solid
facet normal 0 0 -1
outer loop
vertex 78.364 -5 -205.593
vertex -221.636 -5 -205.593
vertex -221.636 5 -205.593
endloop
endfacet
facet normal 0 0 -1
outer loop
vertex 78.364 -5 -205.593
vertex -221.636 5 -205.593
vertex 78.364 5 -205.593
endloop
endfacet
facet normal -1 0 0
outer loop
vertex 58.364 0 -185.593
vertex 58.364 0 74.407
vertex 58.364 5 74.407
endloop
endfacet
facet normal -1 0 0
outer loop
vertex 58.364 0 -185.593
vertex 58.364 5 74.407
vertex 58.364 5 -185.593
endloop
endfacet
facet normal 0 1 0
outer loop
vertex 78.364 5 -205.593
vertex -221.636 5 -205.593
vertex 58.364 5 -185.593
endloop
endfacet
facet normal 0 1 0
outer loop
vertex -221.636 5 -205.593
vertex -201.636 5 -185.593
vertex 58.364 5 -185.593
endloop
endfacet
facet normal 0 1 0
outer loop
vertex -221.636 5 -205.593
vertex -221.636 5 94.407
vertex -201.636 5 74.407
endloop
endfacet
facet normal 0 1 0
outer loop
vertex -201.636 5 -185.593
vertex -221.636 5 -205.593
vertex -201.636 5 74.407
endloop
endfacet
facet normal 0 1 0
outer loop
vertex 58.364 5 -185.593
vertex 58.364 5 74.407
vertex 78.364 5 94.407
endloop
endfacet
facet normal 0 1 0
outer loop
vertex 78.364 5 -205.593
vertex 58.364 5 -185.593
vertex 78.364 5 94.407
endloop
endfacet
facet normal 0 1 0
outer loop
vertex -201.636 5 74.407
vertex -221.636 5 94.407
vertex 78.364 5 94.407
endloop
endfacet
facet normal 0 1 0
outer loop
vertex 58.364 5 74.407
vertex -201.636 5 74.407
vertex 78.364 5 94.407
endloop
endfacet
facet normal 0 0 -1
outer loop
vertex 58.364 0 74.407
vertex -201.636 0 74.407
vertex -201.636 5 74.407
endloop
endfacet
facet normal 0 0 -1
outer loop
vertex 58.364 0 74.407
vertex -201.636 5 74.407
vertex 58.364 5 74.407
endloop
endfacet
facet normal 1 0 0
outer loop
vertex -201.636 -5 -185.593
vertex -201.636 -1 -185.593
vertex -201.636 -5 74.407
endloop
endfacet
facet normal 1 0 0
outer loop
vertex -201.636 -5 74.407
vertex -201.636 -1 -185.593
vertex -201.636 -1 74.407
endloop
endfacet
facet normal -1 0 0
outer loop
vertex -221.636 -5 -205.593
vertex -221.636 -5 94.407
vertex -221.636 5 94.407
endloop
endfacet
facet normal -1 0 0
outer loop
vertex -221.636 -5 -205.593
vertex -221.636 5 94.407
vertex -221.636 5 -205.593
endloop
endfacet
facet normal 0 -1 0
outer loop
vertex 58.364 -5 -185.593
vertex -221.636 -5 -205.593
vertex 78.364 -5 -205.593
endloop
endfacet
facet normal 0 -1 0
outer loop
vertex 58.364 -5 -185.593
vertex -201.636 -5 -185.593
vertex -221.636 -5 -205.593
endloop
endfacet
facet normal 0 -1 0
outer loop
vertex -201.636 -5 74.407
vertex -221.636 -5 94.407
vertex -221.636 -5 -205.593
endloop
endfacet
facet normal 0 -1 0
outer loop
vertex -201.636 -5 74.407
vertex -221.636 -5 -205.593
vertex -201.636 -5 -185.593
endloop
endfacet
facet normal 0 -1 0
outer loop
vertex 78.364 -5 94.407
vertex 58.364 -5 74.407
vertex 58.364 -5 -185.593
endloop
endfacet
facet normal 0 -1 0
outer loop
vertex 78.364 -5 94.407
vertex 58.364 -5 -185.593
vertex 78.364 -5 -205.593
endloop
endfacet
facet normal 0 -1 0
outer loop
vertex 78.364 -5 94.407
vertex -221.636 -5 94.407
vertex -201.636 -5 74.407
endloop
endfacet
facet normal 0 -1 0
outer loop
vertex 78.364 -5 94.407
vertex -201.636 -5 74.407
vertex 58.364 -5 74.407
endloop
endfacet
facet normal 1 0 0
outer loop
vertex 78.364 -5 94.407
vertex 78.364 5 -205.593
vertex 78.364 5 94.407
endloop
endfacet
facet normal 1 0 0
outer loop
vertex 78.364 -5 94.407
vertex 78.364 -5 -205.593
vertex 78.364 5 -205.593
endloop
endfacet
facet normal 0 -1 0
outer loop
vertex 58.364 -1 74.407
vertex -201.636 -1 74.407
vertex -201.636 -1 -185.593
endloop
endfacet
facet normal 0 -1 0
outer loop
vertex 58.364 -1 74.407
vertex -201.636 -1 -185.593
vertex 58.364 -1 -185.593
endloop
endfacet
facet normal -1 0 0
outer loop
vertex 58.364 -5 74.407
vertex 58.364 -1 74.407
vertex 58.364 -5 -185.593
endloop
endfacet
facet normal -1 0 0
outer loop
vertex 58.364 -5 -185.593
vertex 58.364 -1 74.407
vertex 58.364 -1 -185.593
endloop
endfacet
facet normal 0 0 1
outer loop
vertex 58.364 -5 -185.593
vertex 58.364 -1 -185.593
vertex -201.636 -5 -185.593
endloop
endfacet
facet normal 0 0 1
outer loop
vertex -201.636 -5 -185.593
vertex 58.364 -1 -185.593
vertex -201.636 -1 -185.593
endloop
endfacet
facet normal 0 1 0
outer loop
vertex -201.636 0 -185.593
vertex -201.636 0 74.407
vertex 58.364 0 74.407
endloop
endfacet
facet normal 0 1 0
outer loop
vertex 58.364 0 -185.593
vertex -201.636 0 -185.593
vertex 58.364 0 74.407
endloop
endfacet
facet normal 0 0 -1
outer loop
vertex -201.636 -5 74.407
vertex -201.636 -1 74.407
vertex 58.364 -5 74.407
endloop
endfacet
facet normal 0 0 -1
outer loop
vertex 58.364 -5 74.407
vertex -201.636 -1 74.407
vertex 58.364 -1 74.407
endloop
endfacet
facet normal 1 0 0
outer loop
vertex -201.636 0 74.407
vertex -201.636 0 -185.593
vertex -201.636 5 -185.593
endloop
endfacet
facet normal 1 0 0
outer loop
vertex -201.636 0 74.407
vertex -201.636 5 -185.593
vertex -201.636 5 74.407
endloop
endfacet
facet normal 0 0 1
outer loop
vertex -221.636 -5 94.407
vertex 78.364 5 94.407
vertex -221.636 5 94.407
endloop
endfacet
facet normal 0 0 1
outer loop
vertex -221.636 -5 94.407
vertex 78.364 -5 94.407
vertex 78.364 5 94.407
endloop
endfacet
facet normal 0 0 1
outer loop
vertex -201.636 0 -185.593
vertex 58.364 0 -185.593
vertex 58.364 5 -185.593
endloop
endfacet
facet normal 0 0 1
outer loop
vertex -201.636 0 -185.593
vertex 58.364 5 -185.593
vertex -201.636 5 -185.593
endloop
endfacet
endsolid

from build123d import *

# Parameters (mm, degrees)
F0_W     = 260
F0_H     = 260
F1_DEPTH = 1
F0_H_2   = 20
F0_W_2   = 20
F2_DEPTH = 5
F3_DEPTH = 5


with BuildPart() as f1:
    # F0 (on Front) → F1 (new body)
    with BuildSketch(Plane.XZ):
        with Locations((-71.63621746, -55.5927120769)):
            Rectangle(F0_W, F0_H)
    extrude(amount=F1_DEPTH)

    # F0 (on Front) → F2 (join)
    with BuildSketch(Plane.XZ):
        with Locations((-71.63621746, 84.4072879231)):
            Rectangle(F0_W, F0_H_2)
        with Locations((68.36378254, 84.4072879231)):
            Rectangle(F0_W_2, F0_H_2)
        with Locations((68.36378254, -55.5927120769)):
            Rectangle(F0_W_2, F0_H)
        with Locations((68.36378254, -195.5927120769)):
            Rectangle(F0_W_2, F0_H_2)
        with Locations((-71.63621746, -195.5927120769)):
            Rectangle(F0_W, F0_H_2)
        with Locations((-211.63621746, -195.5927120769)):
            Rectangle(F0_W_2, F0_H_2)
        with Locations((-211.63621746, -55.5927120769)):
            Rectangle(F0_W_2, F0_H)
        with Locations((-211.63621746, 84.4072879231)):
            Rectangle(F0_W_2, F0_H_2)
    extrude(amount=F2_DEPTH)

    # F0 (on Front) → F3 (join)
    with BuildSketch(Plane.XZ):
        with Locations((-71.63621746, 84.4072879231)):
            Rectangle(F0_W, F0_H_2)
        with Locations((68.36378254, 84.4072879231)):
            Rectangle(F0_W_2, F0_H_2)
        with Locations((68.36378254, -55.5927120769)):
            Rectangle(F0_W_2, F0_H)
        with Locations((68.36378254, -195.5927120769)):
            Rectangle(F0_W_2, F0_H_2)
        with Locations((-71.63621746, -195.5927120769)):
            Rectangle(F0_W, F0_H_2)
        with Locations((-211.63621746, -195.5927120769)):
            Rectangle(F0_W_2, F0_H_2)
        with Locations((-211.63621746, -55.5927120769)):
            Rectangle(F0_W_2, F0_H)
        with Locations((-211.63621746, 84.4072879231)):
            Rectangle(F0_W_2, F0_H_2)
    extrude(amount=-F3_DEPTH)


solid = f1.part
